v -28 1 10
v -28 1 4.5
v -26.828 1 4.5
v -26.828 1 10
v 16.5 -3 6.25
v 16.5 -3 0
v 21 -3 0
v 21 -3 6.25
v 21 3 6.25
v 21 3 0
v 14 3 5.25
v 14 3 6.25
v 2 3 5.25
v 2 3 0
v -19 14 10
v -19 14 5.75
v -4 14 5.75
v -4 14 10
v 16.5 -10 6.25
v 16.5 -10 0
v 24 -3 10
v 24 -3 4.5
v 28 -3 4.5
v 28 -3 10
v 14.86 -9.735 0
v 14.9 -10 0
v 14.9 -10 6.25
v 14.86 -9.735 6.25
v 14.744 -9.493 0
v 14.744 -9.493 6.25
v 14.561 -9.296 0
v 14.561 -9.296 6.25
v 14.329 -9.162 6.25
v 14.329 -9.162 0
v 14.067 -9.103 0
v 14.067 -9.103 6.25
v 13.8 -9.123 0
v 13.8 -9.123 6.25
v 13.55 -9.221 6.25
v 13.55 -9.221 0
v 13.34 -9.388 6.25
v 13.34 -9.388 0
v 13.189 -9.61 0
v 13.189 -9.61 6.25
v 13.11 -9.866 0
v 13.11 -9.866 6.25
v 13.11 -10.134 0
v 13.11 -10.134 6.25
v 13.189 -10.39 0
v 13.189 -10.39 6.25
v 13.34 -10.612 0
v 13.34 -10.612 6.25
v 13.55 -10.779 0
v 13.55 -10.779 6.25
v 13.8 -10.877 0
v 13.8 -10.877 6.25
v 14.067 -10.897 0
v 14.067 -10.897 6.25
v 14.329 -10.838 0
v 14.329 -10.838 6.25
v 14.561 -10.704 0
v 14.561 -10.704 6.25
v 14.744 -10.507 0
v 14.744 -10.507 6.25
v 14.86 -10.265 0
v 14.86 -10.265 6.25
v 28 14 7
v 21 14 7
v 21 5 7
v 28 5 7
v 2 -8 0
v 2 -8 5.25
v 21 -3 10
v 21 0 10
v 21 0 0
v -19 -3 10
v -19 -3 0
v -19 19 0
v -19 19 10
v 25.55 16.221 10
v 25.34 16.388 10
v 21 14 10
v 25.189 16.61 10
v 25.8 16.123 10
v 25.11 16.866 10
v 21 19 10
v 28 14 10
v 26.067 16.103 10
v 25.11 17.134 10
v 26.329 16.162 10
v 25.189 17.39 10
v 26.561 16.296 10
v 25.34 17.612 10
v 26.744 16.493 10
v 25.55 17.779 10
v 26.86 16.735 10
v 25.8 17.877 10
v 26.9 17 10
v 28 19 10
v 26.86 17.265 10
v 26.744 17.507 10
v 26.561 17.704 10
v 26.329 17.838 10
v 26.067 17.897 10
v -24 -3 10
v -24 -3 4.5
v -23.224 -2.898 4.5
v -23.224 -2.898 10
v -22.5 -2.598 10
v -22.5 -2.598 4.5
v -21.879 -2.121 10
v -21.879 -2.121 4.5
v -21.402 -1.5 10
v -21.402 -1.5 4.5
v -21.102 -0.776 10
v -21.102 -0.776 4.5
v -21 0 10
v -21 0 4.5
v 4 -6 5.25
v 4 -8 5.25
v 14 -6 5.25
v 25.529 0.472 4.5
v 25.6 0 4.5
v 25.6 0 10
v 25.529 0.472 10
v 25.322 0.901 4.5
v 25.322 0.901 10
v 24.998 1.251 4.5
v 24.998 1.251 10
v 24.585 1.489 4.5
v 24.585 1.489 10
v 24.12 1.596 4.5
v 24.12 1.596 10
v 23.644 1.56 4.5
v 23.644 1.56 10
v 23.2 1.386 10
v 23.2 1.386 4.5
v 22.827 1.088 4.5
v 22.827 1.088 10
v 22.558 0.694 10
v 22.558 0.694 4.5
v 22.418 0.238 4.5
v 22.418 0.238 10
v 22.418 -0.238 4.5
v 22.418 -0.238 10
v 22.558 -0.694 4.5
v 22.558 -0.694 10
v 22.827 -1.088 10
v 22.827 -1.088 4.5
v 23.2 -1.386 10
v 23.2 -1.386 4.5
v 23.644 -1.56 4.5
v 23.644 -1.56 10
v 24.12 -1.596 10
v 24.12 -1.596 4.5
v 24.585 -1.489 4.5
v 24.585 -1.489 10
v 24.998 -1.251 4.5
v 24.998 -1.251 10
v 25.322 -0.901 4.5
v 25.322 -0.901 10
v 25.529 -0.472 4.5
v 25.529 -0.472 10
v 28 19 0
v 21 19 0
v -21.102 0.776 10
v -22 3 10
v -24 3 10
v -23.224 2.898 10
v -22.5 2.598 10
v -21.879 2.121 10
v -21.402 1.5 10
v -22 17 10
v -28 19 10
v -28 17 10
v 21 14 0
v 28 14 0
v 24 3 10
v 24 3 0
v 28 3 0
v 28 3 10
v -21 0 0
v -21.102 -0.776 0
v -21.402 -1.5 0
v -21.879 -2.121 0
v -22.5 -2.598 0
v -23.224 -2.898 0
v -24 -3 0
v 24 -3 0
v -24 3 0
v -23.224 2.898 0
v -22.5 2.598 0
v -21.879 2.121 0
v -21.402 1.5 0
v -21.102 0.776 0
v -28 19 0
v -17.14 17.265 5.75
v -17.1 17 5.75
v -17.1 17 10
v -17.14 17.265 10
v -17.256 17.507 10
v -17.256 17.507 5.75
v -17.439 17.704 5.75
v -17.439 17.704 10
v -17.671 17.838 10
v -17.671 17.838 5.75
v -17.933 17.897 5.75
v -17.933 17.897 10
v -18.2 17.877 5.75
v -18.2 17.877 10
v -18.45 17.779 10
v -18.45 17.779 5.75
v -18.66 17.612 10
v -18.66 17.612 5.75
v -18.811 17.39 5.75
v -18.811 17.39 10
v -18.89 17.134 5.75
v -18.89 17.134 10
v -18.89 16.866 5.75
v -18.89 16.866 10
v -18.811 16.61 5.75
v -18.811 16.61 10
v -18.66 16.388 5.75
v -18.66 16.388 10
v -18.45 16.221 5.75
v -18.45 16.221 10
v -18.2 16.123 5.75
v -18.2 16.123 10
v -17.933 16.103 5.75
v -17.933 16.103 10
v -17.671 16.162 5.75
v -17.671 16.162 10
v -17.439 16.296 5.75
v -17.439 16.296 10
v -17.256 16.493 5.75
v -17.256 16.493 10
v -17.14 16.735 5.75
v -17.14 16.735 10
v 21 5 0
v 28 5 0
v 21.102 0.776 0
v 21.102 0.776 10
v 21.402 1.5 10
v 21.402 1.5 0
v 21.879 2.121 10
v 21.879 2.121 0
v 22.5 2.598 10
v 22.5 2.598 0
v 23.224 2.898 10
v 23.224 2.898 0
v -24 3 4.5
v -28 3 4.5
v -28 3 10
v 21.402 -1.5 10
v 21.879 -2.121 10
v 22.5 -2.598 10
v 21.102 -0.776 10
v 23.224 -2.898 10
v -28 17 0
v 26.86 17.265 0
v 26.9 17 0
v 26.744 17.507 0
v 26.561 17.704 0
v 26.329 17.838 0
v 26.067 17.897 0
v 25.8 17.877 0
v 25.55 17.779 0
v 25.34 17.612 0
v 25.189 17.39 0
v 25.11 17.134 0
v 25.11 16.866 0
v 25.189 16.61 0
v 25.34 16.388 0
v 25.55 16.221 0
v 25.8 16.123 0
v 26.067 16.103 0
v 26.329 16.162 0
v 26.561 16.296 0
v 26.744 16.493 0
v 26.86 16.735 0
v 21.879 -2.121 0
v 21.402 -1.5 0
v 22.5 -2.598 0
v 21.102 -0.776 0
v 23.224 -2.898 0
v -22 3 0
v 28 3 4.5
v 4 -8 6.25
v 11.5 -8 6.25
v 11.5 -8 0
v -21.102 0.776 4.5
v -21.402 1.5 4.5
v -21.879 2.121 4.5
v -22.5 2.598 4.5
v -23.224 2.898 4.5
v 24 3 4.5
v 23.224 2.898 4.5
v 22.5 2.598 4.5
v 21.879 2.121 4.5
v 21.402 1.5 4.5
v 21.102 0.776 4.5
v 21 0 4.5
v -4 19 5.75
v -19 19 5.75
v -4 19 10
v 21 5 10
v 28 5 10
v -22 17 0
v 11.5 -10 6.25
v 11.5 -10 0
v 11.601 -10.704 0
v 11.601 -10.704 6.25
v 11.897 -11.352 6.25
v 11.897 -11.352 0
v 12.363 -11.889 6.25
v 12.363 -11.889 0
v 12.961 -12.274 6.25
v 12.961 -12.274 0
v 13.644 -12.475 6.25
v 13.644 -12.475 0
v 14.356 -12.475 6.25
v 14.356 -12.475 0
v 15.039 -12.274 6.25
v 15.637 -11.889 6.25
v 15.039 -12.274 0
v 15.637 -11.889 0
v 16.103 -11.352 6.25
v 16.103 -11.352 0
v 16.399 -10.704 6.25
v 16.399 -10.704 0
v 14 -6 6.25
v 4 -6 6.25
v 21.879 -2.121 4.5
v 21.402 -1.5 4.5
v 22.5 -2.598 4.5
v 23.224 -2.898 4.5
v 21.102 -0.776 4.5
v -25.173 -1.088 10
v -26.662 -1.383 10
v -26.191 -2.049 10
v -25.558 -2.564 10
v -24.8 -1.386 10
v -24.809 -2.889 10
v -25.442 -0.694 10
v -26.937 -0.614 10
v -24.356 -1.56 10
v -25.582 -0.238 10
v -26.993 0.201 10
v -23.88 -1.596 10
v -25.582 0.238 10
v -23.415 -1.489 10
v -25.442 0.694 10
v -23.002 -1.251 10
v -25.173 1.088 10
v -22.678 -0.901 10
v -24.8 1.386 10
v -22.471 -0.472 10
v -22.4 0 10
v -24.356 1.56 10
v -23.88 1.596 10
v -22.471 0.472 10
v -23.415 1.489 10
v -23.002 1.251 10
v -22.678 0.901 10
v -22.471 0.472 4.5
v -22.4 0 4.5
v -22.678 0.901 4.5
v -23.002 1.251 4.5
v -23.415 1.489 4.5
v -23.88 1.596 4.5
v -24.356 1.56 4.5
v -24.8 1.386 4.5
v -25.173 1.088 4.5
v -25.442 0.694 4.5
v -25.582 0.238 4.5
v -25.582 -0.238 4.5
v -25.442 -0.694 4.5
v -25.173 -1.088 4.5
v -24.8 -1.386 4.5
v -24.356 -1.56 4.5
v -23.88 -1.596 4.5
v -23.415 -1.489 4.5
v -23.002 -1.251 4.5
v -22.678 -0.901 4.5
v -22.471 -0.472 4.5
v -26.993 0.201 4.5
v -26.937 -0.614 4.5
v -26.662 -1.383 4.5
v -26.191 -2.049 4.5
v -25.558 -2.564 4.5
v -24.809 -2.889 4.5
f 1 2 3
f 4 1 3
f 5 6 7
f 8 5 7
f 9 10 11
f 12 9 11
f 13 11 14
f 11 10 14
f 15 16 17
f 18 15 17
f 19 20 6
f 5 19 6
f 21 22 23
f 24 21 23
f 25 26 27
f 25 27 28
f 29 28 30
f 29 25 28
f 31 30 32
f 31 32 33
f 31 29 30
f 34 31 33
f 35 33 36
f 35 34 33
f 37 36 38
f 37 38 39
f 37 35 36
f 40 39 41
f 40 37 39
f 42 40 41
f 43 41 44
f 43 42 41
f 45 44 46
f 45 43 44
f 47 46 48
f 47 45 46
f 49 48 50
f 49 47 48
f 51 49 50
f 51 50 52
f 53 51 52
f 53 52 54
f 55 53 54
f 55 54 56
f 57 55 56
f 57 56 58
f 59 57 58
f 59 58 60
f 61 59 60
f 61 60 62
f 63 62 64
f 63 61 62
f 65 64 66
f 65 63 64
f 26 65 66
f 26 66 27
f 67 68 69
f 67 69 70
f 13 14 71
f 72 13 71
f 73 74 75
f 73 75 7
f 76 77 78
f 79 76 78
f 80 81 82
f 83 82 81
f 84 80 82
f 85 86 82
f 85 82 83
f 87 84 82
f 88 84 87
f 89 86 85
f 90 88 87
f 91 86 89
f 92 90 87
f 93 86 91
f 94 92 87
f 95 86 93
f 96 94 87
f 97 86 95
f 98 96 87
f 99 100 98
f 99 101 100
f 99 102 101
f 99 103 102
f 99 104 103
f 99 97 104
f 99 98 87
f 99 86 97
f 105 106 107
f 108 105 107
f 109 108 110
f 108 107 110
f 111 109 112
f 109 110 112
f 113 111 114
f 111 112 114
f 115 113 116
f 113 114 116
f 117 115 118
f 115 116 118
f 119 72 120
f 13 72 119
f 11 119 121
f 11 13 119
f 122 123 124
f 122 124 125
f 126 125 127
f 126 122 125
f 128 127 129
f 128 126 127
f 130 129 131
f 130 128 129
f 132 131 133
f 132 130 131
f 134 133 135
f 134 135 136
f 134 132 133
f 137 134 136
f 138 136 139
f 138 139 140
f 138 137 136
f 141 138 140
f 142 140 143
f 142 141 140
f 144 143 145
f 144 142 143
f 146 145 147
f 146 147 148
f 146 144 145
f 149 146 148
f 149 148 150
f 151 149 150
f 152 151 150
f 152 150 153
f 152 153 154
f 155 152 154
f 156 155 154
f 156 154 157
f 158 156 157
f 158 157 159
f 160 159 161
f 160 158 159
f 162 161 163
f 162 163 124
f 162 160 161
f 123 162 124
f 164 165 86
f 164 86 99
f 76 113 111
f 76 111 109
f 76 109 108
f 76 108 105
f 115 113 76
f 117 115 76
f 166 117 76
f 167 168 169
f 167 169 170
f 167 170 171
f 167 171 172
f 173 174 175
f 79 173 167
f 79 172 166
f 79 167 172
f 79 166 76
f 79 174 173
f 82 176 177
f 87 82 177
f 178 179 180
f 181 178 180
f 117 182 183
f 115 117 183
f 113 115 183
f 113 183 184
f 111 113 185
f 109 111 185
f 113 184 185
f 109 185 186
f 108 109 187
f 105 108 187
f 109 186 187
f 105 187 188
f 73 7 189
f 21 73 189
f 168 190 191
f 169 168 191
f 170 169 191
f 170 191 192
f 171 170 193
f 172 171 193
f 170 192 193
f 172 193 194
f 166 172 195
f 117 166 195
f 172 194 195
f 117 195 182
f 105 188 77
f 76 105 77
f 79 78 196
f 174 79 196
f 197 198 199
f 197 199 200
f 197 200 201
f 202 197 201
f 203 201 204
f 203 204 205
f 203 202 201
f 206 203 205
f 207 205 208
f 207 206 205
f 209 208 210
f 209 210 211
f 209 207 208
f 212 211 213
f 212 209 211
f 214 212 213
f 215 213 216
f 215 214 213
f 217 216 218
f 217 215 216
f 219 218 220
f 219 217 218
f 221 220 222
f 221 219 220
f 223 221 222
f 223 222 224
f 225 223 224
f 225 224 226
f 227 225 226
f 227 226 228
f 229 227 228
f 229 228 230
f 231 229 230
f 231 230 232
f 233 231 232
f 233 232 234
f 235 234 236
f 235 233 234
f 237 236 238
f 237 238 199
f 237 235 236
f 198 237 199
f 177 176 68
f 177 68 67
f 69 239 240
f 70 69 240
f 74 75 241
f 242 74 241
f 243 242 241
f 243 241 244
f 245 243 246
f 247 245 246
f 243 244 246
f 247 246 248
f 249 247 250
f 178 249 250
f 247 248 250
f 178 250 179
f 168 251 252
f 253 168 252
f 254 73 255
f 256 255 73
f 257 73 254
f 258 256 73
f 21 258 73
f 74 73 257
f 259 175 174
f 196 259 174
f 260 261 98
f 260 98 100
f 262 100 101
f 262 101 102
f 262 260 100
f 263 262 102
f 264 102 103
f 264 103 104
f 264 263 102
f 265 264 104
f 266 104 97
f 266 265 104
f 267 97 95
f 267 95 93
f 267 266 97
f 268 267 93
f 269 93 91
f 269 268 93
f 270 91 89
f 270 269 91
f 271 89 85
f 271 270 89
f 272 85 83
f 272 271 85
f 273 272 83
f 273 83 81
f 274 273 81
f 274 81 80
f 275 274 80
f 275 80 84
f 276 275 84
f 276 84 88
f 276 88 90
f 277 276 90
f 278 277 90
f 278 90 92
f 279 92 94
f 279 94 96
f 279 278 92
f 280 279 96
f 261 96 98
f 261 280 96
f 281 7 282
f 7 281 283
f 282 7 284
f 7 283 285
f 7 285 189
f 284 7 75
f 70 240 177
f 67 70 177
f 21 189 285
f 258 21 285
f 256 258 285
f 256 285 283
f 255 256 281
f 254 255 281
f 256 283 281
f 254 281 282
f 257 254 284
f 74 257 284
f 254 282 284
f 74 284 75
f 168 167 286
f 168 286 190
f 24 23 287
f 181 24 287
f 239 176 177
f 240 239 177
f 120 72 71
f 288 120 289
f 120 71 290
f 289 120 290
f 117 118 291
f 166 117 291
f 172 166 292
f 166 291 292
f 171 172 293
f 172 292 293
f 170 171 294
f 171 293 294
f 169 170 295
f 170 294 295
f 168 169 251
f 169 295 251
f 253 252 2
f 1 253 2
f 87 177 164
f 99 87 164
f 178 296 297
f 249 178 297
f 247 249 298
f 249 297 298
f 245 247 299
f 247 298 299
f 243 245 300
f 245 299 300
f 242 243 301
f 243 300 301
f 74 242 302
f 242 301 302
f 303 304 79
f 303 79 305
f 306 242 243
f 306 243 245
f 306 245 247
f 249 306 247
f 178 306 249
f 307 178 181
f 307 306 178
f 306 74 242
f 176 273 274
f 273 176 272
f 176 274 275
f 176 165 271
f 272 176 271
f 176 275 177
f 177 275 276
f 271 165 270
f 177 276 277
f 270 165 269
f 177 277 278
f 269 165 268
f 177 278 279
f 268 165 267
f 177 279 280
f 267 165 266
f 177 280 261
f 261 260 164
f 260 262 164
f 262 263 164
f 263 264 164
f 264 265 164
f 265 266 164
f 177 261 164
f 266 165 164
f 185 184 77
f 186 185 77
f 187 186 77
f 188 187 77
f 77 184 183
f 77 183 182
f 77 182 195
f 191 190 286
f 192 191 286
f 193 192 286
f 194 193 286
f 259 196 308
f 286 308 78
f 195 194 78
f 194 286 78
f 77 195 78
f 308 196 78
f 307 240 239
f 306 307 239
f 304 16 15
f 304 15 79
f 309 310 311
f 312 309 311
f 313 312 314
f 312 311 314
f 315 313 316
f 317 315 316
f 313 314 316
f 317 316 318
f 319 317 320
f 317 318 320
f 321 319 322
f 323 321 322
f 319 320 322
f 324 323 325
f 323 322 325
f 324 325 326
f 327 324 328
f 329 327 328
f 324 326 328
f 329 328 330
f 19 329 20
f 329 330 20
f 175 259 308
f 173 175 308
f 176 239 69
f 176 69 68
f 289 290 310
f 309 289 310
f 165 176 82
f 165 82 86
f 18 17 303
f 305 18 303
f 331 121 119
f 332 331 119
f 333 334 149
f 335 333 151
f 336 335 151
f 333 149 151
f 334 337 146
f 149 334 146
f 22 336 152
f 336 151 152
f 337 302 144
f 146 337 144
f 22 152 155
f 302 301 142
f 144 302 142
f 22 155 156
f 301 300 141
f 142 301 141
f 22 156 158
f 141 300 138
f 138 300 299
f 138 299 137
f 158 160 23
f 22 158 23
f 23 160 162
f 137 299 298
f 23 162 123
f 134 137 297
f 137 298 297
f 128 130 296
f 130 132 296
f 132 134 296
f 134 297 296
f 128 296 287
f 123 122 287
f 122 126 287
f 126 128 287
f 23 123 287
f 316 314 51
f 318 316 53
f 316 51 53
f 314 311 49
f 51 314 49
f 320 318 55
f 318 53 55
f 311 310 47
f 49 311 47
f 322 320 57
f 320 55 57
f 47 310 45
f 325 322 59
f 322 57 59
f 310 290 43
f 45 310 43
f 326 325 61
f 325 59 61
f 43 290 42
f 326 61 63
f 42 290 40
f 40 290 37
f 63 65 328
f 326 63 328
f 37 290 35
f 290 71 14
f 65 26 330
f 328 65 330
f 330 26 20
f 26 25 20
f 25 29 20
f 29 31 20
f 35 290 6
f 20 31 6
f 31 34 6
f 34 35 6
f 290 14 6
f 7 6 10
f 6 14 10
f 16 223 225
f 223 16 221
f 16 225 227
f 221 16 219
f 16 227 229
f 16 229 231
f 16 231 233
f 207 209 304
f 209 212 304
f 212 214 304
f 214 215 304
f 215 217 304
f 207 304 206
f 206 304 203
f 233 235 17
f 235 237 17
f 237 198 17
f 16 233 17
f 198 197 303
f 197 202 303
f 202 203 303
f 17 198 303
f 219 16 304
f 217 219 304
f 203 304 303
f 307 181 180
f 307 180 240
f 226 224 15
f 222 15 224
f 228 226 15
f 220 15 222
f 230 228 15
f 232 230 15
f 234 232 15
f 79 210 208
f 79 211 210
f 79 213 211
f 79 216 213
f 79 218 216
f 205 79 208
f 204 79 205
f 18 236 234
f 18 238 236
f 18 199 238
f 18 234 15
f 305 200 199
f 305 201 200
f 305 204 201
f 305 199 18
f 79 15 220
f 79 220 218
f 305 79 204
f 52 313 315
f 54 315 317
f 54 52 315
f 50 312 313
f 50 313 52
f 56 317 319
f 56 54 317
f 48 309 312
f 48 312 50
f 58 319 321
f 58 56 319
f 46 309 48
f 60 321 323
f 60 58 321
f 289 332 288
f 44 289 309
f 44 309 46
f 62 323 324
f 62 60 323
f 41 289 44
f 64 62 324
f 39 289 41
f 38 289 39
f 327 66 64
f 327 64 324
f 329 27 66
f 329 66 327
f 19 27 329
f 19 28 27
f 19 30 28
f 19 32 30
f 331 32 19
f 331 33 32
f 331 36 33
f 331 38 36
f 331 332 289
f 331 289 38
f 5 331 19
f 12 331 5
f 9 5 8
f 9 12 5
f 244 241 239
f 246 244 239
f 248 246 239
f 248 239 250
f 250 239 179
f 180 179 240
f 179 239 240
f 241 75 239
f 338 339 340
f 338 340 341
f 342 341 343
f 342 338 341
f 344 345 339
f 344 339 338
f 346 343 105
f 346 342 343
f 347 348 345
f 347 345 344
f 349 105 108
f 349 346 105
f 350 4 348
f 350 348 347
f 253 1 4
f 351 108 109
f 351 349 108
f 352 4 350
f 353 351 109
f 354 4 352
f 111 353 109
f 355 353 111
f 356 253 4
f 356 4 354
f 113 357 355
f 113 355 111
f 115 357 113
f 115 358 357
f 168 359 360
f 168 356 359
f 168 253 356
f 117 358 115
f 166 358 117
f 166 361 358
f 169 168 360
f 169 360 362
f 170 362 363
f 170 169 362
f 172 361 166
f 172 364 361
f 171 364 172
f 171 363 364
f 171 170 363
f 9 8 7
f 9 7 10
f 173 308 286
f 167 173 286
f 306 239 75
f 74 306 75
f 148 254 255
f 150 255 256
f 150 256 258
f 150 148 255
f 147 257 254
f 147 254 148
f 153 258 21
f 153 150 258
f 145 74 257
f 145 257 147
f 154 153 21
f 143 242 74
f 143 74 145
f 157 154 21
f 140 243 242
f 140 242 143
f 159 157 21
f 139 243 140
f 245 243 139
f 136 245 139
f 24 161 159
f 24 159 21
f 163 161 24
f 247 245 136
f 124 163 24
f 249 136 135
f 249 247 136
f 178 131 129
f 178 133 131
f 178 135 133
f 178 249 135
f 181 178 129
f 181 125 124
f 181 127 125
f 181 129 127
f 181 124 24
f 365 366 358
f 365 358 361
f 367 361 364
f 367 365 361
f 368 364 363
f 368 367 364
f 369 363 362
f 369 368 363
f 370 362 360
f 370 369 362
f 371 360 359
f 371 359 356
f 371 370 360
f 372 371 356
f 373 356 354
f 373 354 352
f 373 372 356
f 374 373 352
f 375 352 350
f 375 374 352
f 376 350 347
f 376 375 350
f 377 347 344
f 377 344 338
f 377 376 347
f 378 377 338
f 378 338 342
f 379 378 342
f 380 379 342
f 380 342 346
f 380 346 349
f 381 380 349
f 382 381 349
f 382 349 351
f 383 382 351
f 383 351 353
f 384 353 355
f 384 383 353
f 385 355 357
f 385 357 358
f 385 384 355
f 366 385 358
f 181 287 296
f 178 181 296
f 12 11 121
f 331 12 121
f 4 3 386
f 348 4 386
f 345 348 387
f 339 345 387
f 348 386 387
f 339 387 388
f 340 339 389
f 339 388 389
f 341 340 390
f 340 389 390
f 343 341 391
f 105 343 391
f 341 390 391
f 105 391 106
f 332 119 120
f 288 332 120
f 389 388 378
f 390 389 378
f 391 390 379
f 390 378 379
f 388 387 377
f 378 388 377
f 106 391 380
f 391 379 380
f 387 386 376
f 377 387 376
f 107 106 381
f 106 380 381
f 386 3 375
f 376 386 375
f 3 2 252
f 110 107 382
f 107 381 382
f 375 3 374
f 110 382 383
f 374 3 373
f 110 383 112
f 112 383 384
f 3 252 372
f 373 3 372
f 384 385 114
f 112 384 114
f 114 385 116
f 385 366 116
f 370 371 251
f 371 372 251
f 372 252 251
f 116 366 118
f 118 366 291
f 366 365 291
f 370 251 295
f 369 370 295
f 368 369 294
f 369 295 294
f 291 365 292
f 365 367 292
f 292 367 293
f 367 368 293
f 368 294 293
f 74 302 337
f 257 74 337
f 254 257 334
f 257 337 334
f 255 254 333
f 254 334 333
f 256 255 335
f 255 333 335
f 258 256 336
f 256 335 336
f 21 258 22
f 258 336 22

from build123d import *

# Parameters (mm, degrees)
F1_START = 5.75
F0_W     = 15
F0_H     = 5
F0_R     = 0.9
F1_DEPTH = 4.25
F2_DEPTH = 6.25
F0_W_2   = 7
F0_H_2   = 9
F3_DEPTH = 7
F4_DEPTH = 5.25
F0_W_3   = 6
F0_H_3   = 2
F5_DEPTH = 10
F0_R_2   = 1.5
F6_START = 4.5
F0_R_3   = 1.6
F6_DEPTH = 5.5


with BuildPart() as f1:
    # F0 (on Top) → F1 (new body)
    with BuildSketch(Plane.XY.offset(F1_START)):
        with Locations((-11.5, 16.5)):
            Rectangle(F0_W, F0_H)
        with Locations((-18, 17)):
            Circle(F0_R, mode=Mode.SUBTRACT)
    extrude(amount=F1_DEPTH)


with BuildPart() as f2:
    # F0 (on Top) → F2 (new body)
    with BuildSketch(Plane.XY):
        with BuildLine():
            Line((16.5, -10), (16.5, -3))
            Line((16.5, -3), (14, -3))
            Line((14, -3), (14, -6))
            Line((14, -6), (4, -6))
            Line((4, -6), (4, -8))
            Line((4, -8), (11.5, -8))
            Line((11.5, -8), (11.5, -10))
            ThreePointArc((11.5, -10), (14, -7.5), (16.5, -10))
        make_face()
        with BuildLine():
            ThreePointArc((11.5, -10), (14, -12.5), (16.5, -10))
            ThreePointArc((16.5, -10), (14, -7.5), (11.5, -10))
        make_face()
        with Locations((14, -10)):
            Circle(F0_R, mode=Mode.SUBTRACT)
        Polygon((21, -3), (21, 0), (21, 3), (14, 3), (14, -3), (16.5, -3), align=None)
    extrude(amount=F2_DEPTH)

    # F0 (on Top) → F4 (join)
    with BuildSketch(Plane.XY):
        Polygon((14, -3), (14, 3), (2, 3), (2, -3), (2, -8), (4, -8), (4, -6), (14, -6), align=None)
    extrude(amount=F4_DEPTH)


with BuildPart() as f3:
    # F0 (on Top) → F3 (new body)
    with BuildSketch(Plane.XY):
        with Locations((24.5, 9.5)):
            Rectangle(F0_W_2, F0_H_2)
    extrude(amount=F3_DEPTH)


with BuildPart() as f5:
    # F0 (on Top) → F5 (new body)
    with BuildSketch(Plane.XY):
        with Locations((-25, 18)):
            Rectangle(F0_W_3, F0_H_3)
        Polygon((-22, 17), (-22, 3), (-21, 3), (-19, 3), (-19, 14), (-19, 19), (-22, 19), align=None)
        Polygon((-21, 3), (-21, 0), (-21, -3), (-19, -3), (-19, 3), align=None)
        with BuildLine():
            Line((-22, 3), (-24, 3))
            ThreePointArc((-24, 3), (-21.8786796564, 2.1213203436), (-21, 0))
            Line((-21, 0), (-21, 3))
            Line((-21, 3), (-22, 3))
        make_face()
        with BuildLine():
            ThreePointArc((-21, 0), (-21.8786796564, -2.1213203436), (-24, -3))
            Line((-24, -3), (-21, -3))
            Line((-21, -3), (-21, 0))
        make_face()
    extrude(amount=F5_DEPTH)


with BuildPart() as f5b:
    # F0 (on Top) → F5, piece 2 (new body)
    with BuildSketch(Plane.XY):
        with Locations((24.5, 16.5)):
            Rectangle(F0_W_2, F0_H)
        with Locations((26, 17)):
            Circle(F0_R_2, mode=Mode.SUBTRACT)
        with Locations((26, 17)):
            Circle(F0_R_2)
        with Locations((26, 17)):
            Circle(F0_R, mode=Mode.SUBTRACT)
    extrude(amount=F5_DEPTH)


with BuildPart() as f5c:
    # F0 (on Top) → F5, piece 3 (new body)
    with BuildSketch(Plane.XY):
        Polygon((21, 3), (24, 3), (28, 3), (28, 5), (21, 5), align=None)
        with BuildLine():
            ThreePointArc((21, 0), (21.8786796564, 2.1213203436), (24, 3))
            Line((24, 3), (21, 3))
            Line((21, 3), (21, 0))
        make_face()
    extrude(amount=F5_DEPTH)


with BuildPart() as f5d:
    # F0 (on Top) → F5, piece 4 (new body)
    with BuildSketch(Plane.XY):
        with BuildLine():
            Line((21, -3), (24, -3))
            ThreePointArc((24, -3), (21.8786796564, -2.1213203436), (21, 0))
            Line((21, 0), (21, -3))
        make_face()
    extrude(amount=F5_DEPTH)


with BuildPart() as f6:
    # F0 (on Top) → F6 (new body)
    with BuildSketch(Plane.XY.offset(F6_START)):
        with BuildLine():
            ThreePointArc((-24, 3), (-25.7320508076, 2.4494897428), (-26.8284271247, 1))
            ThreePointArc((-26.8284271247, 1), (-26.4494897428, -1.7320508076), (-24, -3))
            ThreePointArc((-24, -3), (-21.8786796564, -2.1213203436), (-21, 0))
            ThreePointArc((-21, 0), (-21.8786796564, 2.1213203436), (-24, 3))
        make_face()
        with Locations((-24, 0)):
            Circle(F0_R_3, mode=Mode.SUBTRACT)
        with BuildLine():
            Line((-28, 1), (-26.8284271247, 1))
            ThreePointArc((-26.8284271247, 1), (-25.7320508076, 2.4494897428), (-24, 3))
            Line((-24, 3), (-28, 3))
            Line((-28, 3), (-28, 1))
        make_face()
    extrude(amount=F6_DEPTH)


with BuildPart() as f6b:
    # F0 (on Top) → F6, piece 2 (new body)
    with BuildSketch(Plane.XY.offset(F6_START)):
        with BuildLine():
            ThreePointArc((24, 3), (26.1213203436, 2.1213203436), (27, 0))
            ThreePointArc((27, 0), (26.1213203436, -2.1213203436), (24, -3))
            Line((24, -3), (28, -3))
            Line((28, -3), (28, 3))
            Line((28, 3), (24, 3))
        make_face()
        with BuildLine():
            ThreePointArc((24, -3), (26.1213203436, -2.1213203436), (27, 0))
            ThreePointArc((27, 0), (26.1213203436, 2.1213203436), (24, 3))
            ThreePointArc((24, 3), (21.8786796564, 2.1213203436), (21, 0))
            ThreePointArc((21, 0), (21.8786796564, -2.1213203436), (24, -3))
        make_face()
        with Locations((24, 0)):
            Circle(F0_R_3, mode=Mode.SUBTRACT)
    extrude(amount=F6_DEPTH)


solid = Compound([f1.part, f2.part, f3.part, f5.part, f5b.part, f5c.part, f5d.part, f6.part, f6b.part])
